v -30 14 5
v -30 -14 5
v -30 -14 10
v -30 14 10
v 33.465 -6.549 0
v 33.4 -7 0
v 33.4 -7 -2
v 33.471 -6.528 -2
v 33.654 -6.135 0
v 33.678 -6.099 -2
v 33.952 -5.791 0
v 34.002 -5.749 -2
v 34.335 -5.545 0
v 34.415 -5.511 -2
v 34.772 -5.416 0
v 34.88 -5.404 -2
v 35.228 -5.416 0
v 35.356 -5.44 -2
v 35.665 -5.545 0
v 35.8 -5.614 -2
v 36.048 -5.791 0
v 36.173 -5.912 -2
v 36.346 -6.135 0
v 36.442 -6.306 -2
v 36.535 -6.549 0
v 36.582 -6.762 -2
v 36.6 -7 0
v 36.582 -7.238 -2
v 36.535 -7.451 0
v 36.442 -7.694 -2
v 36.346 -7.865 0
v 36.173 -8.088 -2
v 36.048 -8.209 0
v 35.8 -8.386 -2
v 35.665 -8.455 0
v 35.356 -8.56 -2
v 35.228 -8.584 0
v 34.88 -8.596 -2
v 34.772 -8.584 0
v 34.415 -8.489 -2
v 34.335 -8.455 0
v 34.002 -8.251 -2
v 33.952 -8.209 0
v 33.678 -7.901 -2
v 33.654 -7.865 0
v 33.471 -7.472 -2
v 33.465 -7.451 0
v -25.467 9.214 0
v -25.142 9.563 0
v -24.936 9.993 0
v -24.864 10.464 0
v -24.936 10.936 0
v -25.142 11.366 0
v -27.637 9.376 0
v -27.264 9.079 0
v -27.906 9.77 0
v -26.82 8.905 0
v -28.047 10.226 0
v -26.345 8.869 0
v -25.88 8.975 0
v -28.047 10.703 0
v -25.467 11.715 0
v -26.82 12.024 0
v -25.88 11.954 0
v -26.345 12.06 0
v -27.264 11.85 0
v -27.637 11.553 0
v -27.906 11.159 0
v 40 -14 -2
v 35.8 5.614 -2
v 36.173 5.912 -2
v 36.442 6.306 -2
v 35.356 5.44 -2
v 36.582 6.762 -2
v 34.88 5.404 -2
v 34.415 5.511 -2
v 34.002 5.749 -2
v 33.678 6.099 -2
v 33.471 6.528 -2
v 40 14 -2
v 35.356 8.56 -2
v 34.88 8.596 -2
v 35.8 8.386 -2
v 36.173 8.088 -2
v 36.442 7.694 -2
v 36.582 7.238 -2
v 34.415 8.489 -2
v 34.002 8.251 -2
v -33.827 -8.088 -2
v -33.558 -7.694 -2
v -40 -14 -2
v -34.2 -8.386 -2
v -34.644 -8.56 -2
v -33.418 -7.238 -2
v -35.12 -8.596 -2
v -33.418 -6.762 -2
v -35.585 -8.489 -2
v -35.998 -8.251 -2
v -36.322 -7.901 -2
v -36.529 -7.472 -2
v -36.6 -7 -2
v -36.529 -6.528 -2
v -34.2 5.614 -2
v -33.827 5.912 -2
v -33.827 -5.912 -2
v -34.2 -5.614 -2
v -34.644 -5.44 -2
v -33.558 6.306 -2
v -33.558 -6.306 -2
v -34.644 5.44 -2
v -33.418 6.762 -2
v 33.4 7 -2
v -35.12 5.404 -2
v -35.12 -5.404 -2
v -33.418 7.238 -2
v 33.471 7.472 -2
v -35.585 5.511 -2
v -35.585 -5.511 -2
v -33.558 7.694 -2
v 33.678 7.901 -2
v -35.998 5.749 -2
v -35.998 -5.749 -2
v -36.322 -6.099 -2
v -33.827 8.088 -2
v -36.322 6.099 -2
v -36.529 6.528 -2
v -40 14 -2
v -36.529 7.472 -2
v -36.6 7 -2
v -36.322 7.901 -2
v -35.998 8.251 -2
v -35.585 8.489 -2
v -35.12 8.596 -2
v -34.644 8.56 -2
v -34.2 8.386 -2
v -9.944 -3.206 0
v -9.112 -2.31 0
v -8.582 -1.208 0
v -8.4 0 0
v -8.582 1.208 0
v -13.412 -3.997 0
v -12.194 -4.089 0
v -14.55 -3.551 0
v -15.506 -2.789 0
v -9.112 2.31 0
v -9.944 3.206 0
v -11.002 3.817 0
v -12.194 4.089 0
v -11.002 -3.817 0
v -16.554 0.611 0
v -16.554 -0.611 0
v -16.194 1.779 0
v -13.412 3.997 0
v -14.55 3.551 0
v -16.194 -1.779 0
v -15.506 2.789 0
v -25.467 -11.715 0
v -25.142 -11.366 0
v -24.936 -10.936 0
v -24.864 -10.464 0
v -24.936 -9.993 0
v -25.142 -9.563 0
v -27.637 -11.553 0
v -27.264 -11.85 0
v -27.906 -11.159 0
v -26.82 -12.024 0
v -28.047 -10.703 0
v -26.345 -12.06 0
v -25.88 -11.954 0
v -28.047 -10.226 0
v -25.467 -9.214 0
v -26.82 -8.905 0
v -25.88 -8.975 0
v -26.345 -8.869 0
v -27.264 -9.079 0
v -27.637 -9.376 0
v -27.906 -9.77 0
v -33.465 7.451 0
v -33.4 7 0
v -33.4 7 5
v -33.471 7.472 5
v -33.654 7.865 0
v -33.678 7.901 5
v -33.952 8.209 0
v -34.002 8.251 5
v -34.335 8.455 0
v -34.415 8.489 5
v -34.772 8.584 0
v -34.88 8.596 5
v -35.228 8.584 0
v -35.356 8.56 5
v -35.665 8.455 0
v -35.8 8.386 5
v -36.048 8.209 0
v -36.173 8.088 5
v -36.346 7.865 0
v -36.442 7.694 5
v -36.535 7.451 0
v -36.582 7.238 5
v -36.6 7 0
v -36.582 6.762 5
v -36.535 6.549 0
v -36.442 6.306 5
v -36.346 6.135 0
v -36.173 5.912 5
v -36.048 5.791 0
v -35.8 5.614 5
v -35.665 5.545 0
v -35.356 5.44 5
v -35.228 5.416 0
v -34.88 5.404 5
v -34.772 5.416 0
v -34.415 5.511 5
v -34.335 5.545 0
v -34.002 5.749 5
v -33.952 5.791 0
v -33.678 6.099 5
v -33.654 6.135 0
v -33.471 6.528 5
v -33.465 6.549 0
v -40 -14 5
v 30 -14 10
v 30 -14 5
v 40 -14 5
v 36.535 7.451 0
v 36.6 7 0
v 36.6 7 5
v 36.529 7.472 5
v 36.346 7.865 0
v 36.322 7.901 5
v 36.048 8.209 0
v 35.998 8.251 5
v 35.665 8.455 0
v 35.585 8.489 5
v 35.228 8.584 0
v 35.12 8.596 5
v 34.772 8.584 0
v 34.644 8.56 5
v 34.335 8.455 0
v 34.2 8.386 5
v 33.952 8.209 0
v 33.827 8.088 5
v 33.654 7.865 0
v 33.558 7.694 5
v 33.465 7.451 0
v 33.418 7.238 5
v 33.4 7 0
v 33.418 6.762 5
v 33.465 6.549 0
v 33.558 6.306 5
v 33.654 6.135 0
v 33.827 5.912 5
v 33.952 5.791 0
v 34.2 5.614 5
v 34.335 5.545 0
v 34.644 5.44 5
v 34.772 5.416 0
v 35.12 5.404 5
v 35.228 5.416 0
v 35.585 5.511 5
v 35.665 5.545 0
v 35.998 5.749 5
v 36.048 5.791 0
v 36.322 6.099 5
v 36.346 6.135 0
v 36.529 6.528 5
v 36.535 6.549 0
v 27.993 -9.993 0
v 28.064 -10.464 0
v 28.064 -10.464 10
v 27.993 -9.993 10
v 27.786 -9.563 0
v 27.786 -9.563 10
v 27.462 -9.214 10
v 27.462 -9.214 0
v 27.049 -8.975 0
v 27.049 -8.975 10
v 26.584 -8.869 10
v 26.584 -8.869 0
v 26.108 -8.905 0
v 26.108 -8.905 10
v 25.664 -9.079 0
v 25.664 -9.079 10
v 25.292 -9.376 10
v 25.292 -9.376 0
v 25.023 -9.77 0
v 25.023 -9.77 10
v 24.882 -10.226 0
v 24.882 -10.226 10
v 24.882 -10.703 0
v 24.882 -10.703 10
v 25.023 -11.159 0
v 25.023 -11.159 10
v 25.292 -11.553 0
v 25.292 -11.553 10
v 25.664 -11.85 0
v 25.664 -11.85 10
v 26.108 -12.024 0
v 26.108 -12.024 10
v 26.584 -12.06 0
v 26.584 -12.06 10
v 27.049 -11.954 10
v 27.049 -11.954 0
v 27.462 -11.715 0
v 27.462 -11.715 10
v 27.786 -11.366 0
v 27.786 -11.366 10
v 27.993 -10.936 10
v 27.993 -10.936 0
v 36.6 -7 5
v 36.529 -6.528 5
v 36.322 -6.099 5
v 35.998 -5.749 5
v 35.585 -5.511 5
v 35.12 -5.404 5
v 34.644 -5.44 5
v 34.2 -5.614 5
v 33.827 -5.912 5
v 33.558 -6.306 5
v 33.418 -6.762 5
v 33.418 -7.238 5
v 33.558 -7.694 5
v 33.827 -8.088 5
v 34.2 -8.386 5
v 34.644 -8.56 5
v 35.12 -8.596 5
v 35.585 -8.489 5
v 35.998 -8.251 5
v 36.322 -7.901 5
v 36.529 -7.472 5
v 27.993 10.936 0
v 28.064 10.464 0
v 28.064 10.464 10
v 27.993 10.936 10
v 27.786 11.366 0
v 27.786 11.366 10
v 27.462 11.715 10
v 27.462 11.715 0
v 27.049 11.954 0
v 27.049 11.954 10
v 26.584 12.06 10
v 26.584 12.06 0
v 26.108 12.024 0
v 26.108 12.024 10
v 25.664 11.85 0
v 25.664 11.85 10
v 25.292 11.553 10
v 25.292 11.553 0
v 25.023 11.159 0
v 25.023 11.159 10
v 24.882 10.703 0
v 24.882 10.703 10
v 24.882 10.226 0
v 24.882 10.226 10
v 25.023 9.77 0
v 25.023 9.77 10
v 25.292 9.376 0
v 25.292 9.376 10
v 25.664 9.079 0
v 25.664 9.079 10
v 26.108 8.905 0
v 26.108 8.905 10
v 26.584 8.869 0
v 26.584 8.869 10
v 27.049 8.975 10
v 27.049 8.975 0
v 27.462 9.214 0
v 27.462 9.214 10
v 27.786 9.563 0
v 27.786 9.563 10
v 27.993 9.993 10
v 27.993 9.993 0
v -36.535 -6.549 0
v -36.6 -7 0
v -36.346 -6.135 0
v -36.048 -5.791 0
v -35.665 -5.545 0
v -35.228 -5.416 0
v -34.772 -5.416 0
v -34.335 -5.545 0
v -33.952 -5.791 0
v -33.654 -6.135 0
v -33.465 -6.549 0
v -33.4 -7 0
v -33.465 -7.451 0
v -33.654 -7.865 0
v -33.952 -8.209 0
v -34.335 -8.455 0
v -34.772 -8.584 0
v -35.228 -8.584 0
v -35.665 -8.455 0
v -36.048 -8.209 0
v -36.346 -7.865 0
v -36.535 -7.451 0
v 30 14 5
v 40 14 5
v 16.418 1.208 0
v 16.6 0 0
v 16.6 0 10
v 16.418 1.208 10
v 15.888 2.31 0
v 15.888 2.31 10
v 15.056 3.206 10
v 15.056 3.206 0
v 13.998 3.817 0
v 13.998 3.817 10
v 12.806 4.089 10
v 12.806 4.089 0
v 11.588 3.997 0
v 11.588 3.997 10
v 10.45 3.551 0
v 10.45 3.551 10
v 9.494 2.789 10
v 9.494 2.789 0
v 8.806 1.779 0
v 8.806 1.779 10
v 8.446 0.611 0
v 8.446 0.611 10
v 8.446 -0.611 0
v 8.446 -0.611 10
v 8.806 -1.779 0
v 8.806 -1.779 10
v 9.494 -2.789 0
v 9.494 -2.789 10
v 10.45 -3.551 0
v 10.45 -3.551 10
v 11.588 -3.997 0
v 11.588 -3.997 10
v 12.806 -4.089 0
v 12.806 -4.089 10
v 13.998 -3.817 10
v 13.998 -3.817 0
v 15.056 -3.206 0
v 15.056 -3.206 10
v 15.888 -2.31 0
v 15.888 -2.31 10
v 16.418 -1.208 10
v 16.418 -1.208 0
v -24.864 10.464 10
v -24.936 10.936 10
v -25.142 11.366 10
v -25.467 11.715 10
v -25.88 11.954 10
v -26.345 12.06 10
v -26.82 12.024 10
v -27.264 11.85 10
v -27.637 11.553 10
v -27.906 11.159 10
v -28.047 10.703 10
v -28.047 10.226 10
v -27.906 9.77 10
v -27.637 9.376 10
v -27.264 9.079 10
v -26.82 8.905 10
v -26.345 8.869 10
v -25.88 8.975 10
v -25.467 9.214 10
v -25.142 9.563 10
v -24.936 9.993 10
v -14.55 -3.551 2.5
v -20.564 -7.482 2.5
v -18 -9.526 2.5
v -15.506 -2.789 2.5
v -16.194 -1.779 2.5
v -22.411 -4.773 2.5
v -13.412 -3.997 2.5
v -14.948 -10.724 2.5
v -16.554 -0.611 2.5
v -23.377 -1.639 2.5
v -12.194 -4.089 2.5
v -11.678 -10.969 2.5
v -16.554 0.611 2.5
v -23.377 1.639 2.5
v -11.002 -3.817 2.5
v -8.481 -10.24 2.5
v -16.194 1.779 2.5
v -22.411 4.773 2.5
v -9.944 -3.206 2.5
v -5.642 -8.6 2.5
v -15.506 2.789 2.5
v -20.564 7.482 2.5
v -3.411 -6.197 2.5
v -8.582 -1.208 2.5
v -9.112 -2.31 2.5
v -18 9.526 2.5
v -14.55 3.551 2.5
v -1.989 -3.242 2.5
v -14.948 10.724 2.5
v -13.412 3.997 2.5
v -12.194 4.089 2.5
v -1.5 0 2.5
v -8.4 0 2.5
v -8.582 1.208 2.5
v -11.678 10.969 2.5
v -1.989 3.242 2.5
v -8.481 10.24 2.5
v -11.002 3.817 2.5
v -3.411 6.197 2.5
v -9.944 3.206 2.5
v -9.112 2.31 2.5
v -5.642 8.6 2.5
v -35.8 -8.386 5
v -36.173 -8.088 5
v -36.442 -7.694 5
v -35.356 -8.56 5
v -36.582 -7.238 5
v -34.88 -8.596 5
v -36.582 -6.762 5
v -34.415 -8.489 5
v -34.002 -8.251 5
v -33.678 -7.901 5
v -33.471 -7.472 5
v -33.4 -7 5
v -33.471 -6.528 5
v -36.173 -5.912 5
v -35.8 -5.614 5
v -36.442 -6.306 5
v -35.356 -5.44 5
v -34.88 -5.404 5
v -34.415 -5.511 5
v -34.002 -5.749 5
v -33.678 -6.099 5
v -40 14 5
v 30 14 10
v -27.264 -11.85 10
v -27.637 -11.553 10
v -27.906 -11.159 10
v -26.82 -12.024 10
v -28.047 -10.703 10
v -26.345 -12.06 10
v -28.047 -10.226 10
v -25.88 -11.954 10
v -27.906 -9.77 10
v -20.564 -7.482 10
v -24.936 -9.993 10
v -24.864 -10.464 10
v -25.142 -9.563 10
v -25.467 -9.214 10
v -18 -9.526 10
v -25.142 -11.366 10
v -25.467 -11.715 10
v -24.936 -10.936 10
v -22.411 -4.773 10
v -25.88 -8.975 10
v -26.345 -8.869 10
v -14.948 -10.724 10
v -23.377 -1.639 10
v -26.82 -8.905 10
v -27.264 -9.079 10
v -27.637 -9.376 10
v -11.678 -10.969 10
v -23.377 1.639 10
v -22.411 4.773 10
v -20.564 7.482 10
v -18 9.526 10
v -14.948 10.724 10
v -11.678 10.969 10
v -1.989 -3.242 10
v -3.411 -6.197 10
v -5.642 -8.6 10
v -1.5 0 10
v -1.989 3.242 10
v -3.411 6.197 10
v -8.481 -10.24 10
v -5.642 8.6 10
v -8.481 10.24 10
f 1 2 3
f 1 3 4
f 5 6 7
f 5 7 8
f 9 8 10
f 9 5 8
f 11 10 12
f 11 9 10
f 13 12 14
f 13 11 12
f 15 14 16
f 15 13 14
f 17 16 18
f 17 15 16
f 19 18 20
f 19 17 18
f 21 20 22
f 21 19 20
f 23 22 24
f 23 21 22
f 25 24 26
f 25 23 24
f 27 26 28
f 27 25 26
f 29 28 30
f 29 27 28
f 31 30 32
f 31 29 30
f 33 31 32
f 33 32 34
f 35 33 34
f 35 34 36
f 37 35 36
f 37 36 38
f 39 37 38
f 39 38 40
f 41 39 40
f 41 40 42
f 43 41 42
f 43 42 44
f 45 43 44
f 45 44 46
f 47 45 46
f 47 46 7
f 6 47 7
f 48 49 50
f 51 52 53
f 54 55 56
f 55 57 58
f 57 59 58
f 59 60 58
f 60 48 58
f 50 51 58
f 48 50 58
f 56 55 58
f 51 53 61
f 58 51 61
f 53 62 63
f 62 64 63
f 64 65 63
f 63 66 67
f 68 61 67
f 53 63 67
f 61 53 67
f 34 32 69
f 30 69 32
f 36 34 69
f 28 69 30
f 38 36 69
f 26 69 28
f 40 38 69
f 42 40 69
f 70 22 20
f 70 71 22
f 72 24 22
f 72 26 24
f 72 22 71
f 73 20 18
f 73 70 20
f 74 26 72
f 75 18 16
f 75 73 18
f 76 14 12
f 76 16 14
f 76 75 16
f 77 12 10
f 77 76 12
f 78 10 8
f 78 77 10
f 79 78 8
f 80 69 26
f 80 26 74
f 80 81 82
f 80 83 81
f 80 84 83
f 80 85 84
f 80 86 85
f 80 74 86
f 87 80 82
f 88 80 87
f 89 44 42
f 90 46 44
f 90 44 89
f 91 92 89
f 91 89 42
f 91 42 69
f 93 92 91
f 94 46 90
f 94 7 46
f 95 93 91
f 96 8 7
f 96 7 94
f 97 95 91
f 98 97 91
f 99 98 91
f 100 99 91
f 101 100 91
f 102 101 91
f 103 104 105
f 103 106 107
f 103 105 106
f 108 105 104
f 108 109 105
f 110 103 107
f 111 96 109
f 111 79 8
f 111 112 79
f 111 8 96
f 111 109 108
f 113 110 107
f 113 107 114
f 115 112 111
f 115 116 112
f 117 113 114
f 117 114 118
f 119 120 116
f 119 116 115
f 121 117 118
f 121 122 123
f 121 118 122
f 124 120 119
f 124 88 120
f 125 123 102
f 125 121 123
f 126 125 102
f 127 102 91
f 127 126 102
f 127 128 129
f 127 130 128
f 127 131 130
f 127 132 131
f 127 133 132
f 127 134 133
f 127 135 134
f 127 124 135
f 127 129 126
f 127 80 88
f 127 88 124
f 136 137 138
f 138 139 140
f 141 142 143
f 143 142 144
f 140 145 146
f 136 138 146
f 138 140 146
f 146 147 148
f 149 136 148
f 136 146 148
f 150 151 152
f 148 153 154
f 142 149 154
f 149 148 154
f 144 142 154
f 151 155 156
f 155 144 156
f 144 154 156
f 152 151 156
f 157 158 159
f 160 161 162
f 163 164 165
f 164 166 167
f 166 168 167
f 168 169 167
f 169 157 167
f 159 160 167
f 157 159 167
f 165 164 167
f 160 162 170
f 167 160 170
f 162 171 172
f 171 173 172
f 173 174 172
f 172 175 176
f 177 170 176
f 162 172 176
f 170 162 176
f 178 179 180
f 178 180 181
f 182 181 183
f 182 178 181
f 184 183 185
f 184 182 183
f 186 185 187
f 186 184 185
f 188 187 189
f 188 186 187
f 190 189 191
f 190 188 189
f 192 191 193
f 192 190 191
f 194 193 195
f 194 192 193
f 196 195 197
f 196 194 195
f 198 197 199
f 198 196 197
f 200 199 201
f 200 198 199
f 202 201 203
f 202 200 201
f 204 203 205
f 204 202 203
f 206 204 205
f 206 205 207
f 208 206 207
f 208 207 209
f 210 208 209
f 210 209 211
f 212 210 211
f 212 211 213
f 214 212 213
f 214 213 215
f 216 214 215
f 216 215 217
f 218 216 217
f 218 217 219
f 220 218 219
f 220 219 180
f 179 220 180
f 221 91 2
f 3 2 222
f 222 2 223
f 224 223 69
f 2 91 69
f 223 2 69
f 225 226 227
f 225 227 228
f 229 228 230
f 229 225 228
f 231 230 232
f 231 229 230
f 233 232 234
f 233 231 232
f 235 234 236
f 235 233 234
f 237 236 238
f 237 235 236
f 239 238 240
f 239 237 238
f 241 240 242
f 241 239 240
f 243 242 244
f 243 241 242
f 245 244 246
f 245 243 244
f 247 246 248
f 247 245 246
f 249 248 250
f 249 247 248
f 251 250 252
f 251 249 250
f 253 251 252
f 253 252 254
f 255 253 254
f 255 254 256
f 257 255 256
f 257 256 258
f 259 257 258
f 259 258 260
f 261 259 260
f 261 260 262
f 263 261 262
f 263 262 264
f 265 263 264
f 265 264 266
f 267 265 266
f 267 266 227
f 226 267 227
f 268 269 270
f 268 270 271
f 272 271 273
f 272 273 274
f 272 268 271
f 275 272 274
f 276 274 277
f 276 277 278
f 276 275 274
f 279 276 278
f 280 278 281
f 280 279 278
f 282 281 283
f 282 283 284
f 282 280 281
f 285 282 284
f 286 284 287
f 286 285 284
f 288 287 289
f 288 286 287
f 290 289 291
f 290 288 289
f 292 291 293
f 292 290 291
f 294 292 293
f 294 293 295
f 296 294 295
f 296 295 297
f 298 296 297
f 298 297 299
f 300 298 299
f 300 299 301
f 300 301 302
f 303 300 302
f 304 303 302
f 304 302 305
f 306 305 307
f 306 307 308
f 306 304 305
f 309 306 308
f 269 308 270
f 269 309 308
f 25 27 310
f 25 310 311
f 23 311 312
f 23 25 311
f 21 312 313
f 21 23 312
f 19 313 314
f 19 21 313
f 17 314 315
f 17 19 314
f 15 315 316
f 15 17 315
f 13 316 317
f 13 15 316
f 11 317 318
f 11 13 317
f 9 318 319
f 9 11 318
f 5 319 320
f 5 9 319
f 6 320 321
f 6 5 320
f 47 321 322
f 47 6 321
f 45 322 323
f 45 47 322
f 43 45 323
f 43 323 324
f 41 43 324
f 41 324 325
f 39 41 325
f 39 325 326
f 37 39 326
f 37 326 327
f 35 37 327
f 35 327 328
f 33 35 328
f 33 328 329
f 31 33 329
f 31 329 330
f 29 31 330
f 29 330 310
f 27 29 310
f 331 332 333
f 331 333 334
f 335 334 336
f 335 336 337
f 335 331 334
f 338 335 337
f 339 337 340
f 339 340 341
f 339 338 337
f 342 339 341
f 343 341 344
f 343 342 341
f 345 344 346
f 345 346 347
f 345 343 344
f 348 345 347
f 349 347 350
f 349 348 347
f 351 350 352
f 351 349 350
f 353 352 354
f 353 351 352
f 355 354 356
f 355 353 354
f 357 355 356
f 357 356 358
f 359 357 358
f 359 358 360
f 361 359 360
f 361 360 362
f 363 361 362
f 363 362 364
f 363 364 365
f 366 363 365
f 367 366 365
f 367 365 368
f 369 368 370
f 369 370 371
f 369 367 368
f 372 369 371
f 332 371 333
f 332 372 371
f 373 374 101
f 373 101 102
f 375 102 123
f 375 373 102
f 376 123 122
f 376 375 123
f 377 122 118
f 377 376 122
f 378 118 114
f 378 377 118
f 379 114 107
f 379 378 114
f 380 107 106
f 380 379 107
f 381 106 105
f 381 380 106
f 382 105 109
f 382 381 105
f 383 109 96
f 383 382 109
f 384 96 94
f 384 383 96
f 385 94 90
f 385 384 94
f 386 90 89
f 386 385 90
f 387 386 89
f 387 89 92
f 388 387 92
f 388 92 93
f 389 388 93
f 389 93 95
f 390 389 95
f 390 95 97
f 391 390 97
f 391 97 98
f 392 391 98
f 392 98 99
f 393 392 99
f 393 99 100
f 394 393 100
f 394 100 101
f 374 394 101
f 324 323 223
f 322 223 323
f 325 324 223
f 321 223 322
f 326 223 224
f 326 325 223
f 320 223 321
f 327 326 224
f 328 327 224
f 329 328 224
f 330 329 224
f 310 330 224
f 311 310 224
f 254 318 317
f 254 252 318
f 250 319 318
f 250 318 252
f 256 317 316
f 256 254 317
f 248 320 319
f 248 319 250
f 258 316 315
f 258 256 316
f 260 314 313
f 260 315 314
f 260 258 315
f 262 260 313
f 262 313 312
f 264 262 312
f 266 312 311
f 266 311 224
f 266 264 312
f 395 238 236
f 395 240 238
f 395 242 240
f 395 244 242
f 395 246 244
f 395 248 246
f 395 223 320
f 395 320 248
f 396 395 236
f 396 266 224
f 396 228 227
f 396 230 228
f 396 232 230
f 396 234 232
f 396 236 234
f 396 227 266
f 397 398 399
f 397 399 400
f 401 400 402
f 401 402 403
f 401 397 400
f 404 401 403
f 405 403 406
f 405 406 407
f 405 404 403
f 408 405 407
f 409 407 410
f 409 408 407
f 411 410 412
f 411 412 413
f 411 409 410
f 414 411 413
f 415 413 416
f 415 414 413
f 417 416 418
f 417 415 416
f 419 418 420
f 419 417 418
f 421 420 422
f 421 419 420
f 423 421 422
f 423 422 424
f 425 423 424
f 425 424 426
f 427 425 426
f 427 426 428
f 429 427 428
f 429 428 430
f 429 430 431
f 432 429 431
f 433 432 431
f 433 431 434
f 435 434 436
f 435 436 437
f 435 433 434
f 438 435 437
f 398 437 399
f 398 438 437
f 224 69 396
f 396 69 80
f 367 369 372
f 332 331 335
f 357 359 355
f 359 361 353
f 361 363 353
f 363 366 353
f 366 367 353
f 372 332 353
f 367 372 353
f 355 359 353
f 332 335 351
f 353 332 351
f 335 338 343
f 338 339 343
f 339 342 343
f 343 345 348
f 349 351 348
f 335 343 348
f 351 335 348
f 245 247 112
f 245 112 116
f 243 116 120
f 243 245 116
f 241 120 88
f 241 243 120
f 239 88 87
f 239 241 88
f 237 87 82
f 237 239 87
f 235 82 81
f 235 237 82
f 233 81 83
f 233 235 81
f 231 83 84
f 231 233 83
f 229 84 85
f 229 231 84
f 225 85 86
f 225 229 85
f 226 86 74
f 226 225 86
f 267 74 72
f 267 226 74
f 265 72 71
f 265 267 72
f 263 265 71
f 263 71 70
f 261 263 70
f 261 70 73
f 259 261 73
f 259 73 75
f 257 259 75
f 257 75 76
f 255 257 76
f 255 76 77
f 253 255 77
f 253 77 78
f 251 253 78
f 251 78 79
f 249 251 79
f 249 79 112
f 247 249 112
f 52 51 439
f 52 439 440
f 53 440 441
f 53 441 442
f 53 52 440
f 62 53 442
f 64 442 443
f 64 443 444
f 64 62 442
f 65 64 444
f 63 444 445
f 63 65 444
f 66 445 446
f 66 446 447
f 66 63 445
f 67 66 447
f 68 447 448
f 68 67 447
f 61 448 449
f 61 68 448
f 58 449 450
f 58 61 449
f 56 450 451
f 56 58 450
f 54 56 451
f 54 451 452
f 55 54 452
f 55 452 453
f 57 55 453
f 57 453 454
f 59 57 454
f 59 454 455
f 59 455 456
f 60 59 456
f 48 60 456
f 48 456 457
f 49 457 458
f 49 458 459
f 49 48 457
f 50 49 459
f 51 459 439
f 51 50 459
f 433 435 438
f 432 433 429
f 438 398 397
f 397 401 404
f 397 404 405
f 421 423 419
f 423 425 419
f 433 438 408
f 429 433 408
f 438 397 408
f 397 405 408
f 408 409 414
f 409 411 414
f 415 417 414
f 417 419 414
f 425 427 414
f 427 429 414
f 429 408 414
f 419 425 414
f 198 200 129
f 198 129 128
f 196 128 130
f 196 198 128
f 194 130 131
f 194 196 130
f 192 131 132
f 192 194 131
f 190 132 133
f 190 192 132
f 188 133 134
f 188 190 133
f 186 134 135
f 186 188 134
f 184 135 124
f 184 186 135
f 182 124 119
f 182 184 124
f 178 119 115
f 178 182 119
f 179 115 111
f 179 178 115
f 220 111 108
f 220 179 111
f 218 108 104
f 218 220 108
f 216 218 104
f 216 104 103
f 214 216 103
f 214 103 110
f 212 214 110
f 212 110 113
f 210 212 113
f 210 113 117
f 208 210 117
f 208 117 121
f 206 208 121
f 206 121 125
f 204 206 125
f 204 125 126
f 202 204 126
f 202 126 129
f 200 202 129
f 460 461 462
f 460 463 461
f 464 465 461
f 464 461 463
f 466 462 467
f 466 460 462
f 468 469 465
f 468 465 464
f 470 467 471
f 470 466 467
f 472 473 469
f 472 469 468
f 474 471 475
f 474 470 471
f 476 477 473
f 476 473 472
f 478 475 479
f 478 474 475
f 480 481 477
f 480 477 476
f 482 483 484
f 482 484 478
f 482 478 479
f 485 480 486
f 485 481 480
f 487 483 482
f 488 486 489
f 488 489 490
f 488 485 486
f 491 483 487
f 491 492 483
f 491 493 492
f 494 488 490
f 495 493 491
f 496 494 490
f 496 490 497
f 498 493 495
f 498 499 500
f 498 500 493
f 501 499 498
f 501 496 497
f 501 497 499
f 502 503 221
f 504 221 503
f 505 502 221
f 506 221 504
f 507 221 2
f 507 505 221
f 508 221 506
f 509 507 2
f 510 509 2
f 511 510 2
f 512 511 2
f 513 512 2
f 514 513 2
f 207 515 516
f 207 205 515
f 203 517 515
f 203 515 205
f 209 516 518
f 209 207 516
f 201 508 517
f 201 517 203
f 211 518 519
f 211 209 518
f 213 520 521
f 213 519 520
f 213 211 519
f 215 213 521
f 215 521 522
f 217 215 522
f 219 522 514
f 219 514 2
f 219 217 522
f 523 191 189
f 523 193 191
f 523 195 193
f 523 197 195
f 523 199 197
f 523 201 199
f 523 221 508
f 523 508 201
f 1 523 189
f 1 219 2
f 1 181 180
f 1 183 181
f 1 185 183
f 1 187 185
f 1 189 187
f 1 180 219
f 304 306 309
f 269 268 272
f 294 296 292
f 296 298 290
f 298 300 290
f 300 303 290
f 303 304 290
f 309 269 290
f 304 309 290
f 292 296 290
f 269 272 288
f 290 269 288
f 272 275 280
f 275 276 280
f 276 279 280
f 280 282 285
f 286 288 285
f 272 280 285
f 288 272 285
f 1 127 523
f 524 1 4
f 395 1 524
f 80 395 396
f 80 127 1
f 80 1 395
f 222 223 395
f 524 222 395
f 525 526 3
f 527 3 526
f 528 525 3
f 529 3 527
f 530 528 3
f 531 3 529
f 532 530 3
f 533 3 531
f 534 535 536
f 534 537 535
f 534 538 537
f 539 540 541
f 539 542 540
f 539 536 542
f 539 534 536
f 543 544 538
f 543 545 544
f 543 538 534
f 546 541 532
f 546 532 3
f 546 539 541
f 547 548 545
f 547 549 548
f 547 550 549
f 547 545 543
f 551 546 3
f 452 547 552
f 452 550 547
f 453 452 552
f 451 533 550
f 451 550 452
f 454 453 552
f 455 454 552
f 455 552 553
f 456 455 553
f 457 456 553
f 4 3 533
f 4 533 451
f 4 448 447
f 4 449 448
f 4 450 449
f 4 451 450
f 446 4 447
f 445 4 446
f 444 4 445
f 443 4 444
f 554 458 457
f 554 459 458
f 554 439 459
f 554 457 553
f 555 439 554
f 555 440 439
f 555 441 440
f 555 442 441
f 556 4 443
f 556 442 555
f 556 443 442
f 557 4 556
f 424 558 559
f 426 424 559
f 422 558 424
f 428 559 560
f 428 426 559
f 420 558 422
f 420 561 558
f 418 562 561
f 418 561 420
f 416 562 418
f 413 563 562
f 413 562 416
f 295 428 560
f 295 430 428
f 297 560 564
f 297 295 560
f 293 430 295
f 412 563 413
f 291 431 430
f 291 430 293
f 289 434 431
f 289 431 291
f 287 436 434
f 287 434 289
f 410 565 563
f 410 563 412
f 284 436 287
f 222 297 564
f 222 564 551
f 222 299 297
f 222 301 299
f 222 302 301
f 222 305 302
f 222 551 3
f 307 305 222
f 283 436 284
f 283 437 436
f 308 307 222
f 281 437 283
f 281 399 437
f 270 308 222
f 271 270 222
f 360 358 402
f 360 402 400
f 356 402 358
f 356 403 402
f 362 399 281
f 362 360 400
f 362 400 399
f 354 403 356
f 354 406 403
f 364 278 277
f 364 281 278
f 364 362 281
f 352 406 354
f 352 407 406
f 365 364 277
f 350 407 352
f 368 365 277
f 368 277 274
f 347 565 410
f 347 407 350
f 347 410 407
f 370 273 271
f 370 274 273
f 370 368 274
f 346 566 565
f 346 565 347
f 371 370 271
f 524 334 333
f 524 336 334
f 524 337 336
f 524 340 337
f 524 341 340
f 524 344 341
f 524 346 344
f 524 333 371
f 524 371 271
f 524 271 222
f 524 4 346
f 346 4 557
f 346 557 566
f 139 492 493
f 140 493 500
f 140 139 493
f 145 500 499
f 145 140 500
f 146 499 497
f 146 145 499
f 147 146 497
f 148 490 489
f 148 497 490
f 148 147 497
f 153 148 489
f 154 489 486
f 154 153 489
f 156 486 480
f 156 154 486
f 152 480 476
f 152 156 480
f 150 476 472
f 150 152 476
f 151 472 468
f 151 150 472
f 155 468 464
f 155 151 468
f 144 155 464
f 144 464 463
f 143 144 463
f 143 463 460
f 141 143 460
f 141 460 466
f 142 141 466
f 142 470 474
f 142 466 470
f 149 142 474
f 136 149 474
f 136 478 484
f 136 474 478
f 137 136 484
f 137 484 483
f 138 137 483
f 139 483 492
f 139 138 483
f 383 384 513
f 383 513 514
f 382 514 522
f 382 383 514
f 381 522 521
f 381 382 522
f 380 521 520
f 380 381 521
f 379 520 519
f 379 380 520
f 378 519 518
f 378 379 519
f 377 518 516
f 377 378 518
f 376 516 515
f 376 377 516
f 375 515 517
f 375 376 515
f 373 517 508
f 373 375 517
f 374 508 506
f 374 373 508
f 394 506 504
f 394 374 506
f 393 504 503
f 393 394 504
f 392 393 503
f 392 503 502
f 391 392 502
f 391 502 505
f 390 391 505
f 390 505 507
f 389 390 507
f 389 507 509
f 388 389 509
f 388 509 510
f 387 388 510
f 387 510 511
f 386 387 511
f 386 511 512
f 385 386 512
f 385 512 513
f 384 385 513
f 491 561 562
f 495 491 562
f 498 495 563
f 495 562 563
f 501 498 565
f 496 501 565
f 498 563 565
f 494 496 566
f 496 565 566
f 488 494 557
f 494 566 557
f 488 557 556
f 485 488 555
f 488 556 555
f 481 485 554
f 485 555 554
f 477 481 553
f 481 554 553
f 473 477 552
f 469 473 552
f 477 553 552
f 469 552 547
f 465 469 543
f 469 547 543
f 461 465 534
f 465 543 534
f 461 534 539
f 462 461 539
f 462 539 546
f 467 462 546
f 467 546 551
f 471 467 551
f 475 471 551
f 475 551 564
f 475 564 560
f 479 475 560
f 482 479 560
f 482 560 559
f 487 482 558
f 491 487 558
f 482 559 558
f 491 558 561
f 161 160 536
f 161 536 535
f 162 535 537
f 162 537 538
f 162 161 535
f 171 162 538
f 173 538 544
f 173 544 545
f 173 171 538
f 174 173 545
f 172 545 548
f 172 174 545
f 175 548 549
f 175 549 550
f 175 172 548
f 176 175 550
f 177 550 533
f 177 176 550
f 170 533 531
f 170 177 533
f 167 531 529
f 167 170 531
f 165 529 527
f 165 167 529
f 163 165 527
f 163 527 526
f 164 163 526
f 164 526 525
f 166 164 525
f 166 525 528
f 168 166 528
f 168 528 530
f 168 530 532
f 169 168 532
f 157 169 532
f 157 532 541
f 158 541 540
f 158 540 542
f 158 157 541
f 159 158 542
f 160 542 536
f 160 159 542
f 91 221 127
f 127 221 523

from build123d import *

# Parameters (mm, degrees)
SKETCH1_W           = 60
SKETCH1_H           = 28
SKETCH1_R           = 4.1
SKETCH1_R_2         = 1.6
BOSS_EXTRUDE1_DEPTH = 10
SKETCH2_R           = 11
CUT_EXTRUDE1_DEPTH  = 7.5
SKETCH3_R           = 1.6
BOSS_EXTRUDE2_DEPTH = 2
SKETCH4_W           = 10
SKETCH4_H           = 28
SKETCH4_R           = 1.6
BOSS_EXTRUDE3_DEPTH = 5


with BuildPart() as part:
    # Sketch1 → Boss-Extrude1 (new body)
    with BuildSketch(Plane.XY):
        Rectangle(SKETCH1_W, SKETCH1_H)
        with Locations((12.5, 0)):
            Circle(SKETCH1_R, mode=Mode.SUBTRACT)
        with Locations((-12.5, 0)):
            Circle(SKETCH1_R, mode=Mode.SUBTRACT)
        with Locations((-26.464466094, 10.464466094)):
            Circle(SKETCH1_R_2, mode=Mode.SUBTRACT)
        with Locations((-26.464466094, -10.464466094)):
            Circle(SKETCH1_R_2, mode=Mode.SUBTRACT)
        with Locations((26.464466094, -10.464466094)):
            Circle(SKETCH1_R_2, mode=Mode.SUBTRACT)
        with Locations((26.464466094, 10.464466094)):
            Circle(SKETCH1_R_2, mode=Mode.SUBTRACT)
    extrude(amount=BOSS_EXTRUDE1_DEPTH)

    # Sketch2 → Cut-Extrude1 (cut)
    with BuildSketch(Plane.XY.offset(10)):
        with Locations((-12.5, 0)):
            Circle(SKETCH2_R)
    extrude(amount=-CUT_EXTRUDE1_DEPTH, mode=Mode.SUBTRACT)

    # Sketch3 → Boss-Extrude2 (add)
    with BuildSketch(Plane(origin=(0, 0, 0), x_dir=(-1, 0, 0), z_dir=(0, 0, -1))):
        Polygon((-30, 14), (-40, 14), (-40, -14), (-30, -14), (30, -14), (40, -14), (40, 14), (30, 14), align=None)
        with Locations((-35, 7)):
            Circle(SKETCH3_R, mode=Mode.SUBTRACT)
        with Locations((-35, -7)):
            Circle(SKETCH3_R, mode=Mode.SUBTRACT)
        with Locations((35, -7)):
            Circle(SKETCH3_R, mode=Mode.SUBTRACT)
        with Locations((35, 7)):
            Circle(SKETCH3_R, mode=Mode.SUBTRACT)
    extrude(amount=BOSS_EXTRUDE2_DEPTH)

    # Sketch4 → Boss-Extrude3 (add)
    with BuildSketch(Plane.XY):
        with Locations((35, 0)):
            Rectangle(SKETCH4_W, SKETCH4_H)
        with Locations((35, -7)):
            Circle(SKETCH4_R, mode=Mode.SUBTRACT)
        with Locations((35, 7)):
            Circle(SKETCH4_R, mode=Mode.SUBTRACT)
        with Locations((-35, 0)):
            Rectangle(SKETCH4_W, SKETCH4_H)
        with Locations((-35, -7)):
            Circle(SKETCH4_R, mode=Mode.SUBTRACT)
        with Locations((-35, 7)):
            Circle(SKETCH4_R, mode=Mode.SUBTRACT)
    extrude(amount=BOSS_EXTRUDE3_DEPTH)


solid = part.part
